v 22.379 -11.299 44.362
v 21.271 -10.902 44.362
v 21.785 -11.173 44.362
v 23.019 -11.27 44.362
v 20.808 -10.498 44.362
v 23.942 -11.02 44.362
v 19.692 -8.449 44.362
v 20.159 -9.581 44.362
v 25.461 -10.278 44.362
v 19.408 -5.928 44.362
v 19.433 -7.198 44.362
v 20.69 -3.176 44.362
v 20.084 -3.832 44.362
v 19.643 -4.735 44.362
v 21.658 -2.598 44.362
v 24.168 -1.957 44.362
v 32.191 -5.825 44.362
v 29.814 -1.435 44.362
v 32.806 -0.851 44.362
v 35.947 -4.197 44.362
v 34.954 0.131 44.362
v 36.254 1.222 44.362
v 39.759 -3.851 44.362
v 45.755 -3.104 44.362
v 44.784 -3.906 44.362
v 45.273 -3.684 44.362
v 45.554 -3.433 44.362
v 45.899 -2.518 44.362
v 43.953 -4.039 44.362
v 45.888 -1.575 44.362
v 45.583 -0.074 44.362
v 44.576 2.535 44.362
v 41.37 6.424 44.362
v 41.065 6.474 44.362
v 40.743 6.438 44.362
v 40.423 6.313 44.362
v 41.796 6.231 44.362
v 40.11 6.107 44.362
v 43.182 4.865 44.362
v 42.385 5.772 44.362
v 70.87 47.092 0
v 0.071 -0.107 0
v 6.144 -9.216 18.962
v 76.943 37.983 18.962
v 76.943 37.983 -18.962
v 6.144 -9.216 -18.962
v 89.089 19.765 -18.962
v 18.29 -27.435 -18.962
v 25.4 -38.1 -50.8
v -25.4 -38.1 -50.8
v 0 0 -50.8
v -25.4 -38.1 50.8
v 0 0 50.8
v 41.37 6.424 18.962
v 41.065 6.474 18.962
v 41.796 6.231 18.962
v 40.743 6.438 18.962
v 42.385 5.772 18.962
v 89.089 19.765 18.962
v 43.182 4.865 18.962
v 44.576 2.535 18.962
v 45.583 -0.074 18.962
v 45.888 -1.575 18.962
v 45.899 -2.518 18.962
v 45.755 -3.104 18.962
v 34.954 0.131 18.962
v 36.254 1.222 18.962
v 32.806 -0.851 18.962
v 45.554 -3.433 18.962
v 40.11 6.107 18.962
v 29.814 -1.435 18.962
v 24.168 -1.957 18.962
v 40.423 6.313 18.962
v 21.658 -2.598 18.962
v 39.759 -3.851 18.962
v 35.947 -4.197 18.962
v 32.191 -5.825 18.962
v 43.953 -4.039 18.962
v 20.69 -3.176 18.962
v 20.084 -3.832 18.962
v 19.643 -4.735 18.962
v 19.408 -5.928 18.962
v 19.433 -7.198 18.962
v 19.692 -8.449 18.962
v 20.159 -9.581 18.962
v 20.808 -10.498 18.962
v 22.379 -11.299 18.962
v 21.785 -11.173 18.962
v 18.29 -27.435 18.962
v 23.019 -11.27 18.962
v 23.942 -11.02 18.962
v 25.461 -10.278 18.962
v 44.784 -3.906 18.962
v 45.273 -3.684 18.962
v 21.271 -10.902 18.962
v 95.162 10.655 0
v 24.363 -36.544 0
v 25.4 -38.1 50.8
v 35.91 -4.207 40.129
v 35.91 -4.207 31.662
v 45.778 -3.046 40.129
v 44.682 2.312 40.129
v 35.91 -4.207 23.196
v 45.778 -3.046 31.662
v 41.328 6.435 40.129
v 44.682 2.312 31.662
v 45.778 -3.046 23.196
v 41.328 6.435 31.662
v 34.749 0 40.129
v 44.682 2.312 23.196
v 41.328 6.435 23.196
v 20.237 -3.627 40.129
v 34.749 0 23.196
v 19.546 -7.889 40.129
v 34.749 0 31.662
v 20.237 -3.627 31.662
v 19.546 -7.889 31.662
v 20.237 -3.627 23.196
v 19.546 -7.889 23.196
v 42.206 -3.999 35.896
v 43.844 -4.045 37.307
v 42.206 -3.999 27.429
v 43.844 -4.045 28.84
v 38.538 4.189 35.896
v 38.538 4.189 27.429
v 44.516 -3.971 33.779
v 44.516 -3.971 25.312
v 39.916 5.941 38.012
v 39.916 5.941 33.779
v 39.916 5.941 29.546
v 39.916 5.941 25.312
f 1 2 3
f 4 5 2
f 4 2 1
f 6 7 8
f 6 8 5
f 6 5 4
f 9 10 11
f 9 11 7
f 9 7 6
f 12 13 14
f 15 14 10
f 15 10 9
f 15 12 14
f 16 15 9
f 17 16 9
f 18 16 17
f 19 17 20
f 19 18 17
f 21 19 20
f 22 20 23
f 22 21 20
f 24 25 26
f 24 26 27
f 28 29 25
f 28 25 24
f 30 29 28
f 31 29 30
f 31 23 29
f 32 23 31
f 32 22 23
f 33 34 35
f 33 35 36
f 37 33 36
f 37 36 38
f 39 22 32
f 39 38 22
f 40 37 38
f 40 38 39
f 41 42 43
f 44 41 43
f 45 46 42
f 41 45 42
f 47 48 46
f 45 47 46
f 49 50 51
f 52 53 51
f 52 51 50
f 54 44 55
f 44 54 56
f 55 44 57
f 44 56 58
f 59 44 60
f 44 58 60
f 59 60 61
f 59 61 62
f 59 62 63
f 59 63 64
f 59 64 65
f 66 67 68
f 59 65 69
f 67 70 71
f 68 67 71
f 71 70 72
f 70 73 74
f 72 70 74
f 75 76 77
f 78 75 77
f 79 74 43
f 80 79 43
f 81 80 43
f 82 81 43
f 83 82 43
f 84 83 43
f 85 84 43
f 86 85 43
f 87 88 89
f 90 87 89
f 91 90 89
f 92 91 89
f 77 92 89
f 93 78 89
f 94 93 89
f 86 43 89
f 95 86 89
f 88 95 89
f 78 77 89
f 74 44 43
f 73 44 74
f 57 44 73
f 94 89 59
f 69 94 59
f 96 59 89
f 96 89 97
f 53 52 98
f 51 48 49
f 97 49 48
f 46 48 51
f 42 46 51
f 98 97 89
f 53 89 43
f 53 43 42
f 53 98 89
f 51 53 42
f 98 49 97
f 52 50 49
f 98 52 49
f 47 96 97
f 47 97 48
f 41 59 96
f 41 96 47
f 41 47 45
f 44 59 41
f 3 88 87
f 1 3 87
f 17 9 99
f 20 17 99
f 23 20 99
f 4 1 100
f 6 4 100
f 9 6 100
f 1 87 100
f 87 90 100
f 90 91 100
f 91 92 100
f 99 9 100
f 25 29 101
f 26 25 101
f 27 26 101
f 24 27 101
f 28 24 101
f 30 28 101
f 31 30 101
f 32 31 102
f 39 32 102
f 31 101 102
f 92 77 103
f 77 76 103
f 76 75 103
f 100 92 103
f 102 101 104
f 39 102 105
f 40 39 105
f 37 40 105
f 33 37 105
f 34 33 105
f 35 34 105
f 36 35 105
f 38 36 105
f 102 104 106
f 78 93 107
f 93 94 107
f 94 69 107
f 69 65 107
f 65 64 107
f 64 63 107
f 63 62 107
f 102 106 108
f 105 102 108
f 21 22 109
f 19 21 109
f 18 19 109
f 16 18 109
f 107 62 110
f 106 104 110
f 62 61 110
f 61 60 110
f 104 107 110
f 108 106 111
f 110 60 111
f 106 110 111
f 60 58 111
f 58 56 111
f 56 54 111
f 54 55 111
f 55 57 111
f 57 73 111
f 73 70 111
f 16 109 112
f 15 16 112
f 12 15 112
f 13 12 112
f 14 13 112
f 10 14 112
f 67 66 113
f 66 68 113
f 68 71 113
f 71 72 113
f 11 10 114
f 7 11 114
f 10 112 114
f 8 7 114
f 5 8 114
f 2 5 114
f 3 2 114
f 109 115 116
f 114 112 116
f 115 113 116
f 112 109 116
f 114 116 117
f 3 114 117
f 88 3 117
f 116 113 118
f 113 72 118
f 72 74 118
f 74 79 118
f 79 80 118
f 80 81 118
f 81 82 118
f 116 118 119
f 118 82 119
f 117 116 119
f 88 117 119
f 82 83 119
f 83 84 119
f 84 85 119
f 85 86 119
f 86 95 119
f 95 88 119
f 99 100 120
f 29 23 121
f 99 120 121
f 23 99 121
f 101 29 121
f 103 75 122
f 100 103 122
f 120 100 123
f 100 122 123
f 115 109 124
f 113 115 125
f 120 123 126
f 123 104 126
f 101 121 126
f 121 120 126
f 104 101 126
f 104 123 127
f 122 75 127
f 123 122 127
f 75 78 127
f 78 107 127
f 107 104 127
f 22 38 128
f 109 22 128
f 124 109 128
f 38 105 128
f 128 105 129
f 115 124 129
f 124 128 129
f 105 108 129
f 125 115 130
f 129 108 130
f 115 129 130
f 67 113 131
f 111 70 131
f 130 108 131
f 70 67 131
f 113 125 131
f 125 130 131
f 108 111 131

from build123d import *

# Parameters (mm, degrees)
F1_DEPTH = 50.8
F3_DEPTH = 85.09
F5_DEPTH = 25.4


with BuildPart() as f1:
    # F0 (on Top) → F1 (new body, symmetric)
    with BuildSketch(Plane.XY):
        Polygon((25.4, -38.1), (0, 0), (-25.4, -38.1), align=None)
    extrude(amount=F1_DEPTH, both=True)

    # F2 (on face) → F3 (join)
    with BuildSketch(Plane(origin=(0, 0, 0), x_dir=(-0.5547001962, 0.8320502943, 0), z_dir=(0.8320502943, 0.5547001962, 0))):
        Polygon((-11.0765361257, 18.9624670893), (-32.9725070827, 18.9624670893), (-43.9204925612, 0), (-32.9725070827, -18.9624670893), (-11.0765361257, -18.9624670893), (-0.1285506472, 0), align=None)
    extrude(amount=F3_DEPTH)

    # F4 (on face) → F5 (join)
    with BuildSketch(Plane.XY.offset(18.9624670893)):
        with BuildLine():
            add(Edge.make_bspline(
                [(21.7850599438, -11.1728273332), (24.91196927, -12.324822675), (34.5838238055, -0.3628267994), (49.6700135525, -7.3872989451), (40.5615667196, 12.1756003251), (36.6019703838, -4.1668657612), (17.0137429969, 0.7146759114), (19.5981739455, -10.3671491954), (21.7850599438, -11.1728273332)],
                knots=[0, 0, 0, 0, 0.1980925373, 0.3554361767, 0.5169793381, 0.6684045786, 0.8614587917, 1, 1, 1, 1], degree=3))
        make_face()
    extrude(amount=F5_DEPTH)


solid = f1.part
